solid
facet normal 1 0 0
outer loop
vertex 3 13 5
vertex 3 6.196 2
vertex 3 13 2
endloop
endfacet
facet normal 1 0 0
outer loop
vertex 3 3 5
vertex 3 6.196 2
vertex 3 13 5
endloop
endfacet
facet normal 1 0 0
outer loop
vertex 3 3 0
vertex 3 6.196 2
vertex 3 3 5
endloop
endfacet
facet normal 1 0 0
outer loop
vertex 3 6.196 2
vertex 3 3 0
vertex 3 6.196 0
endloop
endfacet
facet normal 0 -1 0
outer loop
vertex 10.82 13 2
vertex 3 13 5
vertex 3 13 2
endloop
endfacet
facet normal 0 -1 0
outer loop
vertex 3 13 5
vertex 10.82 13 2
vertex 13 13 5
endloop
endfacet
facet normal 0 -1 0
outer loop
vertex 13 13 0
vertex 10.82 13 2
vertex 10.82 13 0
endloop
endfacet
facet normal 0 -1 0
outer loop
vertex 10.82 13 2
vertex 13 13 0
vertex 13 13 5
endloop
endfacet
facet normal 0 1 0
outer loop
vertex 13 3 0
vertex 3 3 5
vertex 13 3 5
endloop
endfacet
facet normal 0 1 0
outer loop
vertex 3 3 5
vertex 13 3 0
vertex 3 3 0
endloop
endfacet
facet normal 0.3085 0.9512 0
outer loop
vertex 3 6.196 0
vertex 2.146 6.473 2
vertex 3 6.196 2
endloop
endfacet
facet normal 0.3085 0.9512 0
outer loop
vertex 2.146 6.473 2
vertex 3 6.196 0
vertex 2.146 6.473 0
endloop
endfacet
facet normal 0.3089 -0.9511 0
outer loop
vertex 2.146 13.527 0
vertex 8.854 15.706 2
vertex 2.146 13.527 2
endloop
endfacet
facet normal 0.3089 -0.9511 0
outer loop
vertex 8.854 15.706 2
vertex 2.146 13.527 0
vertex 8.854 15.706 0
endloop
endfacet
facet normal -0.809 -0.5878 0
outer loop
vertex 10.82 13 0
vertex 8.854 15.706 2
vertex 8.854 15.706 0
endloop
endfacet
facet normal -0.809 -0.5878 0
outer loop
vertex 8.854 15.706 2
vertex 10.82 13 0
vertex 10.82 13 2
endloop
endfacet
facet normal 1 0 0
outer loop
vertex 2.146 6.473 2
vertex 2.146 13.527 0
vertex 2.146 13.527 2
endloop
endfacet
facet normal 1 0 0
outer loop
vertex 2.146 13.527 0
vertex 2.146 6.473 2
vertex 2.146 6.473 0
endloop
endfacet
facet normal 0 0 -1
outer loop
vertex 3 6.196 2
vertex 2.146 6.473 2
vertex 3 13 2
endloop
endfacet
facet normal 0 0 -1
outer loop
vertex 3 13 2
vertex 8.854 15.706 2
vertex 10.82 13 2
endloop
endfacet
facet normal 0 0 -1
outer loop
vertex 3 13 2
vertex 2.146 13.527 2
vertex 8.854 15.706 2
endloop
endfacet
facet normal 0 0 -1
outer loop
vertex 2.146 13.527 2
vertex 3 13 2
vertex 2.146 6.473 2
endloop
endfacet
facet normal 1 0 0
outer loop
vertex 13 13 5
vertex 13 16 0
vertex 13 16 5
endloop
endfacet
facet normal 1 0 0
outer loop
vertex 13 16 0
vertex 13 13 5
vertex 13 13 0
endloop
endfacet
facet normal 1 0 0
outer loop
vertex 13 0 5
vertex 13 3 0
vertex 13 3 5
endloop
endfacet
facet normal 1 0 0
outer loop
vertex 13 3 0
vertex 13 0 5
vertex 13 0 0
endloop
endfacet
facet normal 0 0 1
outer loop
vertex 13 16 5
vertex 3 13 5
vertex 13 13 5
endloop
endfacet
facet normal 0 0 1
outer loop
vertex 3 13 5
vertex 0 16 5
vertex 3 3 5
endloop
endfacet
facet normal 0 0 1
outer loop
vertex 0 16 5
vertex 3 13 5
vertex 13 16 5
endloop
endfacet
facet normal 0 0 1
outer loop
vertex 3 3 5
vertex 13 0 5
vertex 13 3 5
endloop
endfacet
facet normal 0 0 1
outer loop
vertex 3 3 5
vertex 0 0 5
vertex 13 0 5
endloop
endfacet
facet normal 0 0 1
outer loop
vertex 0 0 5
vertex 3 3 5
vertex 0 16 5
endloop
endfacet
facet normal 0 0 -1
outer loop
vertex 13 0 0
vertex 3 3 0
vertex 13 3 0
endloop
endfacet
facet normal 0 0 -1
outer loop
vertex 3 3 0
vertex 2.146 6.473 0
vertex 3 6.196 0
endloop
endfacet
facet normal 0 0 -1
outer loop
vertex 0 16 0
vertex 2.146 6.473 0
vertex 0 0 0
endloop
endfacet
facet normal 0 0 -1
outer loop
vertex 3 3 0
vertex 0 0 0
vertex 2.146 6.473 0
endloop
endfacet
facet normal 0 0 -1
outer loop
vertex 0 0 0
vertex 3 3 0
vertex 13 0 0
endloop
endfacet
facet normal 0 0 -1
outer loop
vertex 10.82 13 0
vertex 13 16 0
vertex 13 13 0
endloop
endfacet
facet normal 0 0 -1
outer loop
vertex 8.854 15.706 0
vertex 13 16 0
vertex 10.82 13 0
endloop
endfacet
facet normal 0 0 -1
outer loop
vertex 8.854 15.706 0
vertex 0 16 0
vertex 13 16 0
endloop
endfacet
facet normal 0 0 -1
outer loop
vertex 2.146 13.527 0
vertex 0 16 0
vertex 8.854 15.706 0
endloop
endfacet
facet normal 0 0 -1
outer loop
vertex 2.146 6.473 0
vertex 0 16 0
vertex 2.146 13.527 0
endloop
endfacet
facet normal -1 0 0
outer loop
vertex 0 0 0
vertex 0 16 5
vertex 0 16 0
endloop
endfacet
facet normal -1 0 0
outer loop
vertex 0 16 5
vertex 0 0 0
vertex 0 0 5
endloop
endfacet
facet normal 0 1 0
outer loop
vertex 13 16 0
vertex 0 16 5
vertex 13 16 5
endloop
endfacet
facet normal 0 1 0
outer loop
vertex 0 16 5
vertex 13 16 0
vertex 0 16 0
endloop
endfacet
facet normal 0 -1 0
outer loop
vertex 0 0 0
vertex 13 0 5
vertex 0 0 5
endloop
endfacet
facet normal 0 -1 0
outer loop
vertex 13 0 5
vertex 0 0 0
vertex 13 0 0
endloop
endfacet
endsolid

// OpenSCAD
gap = 10; // mm
width = 10; // mm
depth = 5; // mm
thickness = 3; // mm
radius = 6; // mm
inset_y = 3; // mm
inset_x = 3; // mm
difference()
{
scale([width + thickness, gap + thickness * 2, depth])
{
    cube();
}
union()
{
translate([thickness, thickness, -thickness])
scale([width + thickness, gap, depth + thickness * 2])
{
    cube();
}
translate([width - inset_x, thickness + gap - inset_y, -thickness])
scale([radius, radius, depth])
cylinder();
}
}
